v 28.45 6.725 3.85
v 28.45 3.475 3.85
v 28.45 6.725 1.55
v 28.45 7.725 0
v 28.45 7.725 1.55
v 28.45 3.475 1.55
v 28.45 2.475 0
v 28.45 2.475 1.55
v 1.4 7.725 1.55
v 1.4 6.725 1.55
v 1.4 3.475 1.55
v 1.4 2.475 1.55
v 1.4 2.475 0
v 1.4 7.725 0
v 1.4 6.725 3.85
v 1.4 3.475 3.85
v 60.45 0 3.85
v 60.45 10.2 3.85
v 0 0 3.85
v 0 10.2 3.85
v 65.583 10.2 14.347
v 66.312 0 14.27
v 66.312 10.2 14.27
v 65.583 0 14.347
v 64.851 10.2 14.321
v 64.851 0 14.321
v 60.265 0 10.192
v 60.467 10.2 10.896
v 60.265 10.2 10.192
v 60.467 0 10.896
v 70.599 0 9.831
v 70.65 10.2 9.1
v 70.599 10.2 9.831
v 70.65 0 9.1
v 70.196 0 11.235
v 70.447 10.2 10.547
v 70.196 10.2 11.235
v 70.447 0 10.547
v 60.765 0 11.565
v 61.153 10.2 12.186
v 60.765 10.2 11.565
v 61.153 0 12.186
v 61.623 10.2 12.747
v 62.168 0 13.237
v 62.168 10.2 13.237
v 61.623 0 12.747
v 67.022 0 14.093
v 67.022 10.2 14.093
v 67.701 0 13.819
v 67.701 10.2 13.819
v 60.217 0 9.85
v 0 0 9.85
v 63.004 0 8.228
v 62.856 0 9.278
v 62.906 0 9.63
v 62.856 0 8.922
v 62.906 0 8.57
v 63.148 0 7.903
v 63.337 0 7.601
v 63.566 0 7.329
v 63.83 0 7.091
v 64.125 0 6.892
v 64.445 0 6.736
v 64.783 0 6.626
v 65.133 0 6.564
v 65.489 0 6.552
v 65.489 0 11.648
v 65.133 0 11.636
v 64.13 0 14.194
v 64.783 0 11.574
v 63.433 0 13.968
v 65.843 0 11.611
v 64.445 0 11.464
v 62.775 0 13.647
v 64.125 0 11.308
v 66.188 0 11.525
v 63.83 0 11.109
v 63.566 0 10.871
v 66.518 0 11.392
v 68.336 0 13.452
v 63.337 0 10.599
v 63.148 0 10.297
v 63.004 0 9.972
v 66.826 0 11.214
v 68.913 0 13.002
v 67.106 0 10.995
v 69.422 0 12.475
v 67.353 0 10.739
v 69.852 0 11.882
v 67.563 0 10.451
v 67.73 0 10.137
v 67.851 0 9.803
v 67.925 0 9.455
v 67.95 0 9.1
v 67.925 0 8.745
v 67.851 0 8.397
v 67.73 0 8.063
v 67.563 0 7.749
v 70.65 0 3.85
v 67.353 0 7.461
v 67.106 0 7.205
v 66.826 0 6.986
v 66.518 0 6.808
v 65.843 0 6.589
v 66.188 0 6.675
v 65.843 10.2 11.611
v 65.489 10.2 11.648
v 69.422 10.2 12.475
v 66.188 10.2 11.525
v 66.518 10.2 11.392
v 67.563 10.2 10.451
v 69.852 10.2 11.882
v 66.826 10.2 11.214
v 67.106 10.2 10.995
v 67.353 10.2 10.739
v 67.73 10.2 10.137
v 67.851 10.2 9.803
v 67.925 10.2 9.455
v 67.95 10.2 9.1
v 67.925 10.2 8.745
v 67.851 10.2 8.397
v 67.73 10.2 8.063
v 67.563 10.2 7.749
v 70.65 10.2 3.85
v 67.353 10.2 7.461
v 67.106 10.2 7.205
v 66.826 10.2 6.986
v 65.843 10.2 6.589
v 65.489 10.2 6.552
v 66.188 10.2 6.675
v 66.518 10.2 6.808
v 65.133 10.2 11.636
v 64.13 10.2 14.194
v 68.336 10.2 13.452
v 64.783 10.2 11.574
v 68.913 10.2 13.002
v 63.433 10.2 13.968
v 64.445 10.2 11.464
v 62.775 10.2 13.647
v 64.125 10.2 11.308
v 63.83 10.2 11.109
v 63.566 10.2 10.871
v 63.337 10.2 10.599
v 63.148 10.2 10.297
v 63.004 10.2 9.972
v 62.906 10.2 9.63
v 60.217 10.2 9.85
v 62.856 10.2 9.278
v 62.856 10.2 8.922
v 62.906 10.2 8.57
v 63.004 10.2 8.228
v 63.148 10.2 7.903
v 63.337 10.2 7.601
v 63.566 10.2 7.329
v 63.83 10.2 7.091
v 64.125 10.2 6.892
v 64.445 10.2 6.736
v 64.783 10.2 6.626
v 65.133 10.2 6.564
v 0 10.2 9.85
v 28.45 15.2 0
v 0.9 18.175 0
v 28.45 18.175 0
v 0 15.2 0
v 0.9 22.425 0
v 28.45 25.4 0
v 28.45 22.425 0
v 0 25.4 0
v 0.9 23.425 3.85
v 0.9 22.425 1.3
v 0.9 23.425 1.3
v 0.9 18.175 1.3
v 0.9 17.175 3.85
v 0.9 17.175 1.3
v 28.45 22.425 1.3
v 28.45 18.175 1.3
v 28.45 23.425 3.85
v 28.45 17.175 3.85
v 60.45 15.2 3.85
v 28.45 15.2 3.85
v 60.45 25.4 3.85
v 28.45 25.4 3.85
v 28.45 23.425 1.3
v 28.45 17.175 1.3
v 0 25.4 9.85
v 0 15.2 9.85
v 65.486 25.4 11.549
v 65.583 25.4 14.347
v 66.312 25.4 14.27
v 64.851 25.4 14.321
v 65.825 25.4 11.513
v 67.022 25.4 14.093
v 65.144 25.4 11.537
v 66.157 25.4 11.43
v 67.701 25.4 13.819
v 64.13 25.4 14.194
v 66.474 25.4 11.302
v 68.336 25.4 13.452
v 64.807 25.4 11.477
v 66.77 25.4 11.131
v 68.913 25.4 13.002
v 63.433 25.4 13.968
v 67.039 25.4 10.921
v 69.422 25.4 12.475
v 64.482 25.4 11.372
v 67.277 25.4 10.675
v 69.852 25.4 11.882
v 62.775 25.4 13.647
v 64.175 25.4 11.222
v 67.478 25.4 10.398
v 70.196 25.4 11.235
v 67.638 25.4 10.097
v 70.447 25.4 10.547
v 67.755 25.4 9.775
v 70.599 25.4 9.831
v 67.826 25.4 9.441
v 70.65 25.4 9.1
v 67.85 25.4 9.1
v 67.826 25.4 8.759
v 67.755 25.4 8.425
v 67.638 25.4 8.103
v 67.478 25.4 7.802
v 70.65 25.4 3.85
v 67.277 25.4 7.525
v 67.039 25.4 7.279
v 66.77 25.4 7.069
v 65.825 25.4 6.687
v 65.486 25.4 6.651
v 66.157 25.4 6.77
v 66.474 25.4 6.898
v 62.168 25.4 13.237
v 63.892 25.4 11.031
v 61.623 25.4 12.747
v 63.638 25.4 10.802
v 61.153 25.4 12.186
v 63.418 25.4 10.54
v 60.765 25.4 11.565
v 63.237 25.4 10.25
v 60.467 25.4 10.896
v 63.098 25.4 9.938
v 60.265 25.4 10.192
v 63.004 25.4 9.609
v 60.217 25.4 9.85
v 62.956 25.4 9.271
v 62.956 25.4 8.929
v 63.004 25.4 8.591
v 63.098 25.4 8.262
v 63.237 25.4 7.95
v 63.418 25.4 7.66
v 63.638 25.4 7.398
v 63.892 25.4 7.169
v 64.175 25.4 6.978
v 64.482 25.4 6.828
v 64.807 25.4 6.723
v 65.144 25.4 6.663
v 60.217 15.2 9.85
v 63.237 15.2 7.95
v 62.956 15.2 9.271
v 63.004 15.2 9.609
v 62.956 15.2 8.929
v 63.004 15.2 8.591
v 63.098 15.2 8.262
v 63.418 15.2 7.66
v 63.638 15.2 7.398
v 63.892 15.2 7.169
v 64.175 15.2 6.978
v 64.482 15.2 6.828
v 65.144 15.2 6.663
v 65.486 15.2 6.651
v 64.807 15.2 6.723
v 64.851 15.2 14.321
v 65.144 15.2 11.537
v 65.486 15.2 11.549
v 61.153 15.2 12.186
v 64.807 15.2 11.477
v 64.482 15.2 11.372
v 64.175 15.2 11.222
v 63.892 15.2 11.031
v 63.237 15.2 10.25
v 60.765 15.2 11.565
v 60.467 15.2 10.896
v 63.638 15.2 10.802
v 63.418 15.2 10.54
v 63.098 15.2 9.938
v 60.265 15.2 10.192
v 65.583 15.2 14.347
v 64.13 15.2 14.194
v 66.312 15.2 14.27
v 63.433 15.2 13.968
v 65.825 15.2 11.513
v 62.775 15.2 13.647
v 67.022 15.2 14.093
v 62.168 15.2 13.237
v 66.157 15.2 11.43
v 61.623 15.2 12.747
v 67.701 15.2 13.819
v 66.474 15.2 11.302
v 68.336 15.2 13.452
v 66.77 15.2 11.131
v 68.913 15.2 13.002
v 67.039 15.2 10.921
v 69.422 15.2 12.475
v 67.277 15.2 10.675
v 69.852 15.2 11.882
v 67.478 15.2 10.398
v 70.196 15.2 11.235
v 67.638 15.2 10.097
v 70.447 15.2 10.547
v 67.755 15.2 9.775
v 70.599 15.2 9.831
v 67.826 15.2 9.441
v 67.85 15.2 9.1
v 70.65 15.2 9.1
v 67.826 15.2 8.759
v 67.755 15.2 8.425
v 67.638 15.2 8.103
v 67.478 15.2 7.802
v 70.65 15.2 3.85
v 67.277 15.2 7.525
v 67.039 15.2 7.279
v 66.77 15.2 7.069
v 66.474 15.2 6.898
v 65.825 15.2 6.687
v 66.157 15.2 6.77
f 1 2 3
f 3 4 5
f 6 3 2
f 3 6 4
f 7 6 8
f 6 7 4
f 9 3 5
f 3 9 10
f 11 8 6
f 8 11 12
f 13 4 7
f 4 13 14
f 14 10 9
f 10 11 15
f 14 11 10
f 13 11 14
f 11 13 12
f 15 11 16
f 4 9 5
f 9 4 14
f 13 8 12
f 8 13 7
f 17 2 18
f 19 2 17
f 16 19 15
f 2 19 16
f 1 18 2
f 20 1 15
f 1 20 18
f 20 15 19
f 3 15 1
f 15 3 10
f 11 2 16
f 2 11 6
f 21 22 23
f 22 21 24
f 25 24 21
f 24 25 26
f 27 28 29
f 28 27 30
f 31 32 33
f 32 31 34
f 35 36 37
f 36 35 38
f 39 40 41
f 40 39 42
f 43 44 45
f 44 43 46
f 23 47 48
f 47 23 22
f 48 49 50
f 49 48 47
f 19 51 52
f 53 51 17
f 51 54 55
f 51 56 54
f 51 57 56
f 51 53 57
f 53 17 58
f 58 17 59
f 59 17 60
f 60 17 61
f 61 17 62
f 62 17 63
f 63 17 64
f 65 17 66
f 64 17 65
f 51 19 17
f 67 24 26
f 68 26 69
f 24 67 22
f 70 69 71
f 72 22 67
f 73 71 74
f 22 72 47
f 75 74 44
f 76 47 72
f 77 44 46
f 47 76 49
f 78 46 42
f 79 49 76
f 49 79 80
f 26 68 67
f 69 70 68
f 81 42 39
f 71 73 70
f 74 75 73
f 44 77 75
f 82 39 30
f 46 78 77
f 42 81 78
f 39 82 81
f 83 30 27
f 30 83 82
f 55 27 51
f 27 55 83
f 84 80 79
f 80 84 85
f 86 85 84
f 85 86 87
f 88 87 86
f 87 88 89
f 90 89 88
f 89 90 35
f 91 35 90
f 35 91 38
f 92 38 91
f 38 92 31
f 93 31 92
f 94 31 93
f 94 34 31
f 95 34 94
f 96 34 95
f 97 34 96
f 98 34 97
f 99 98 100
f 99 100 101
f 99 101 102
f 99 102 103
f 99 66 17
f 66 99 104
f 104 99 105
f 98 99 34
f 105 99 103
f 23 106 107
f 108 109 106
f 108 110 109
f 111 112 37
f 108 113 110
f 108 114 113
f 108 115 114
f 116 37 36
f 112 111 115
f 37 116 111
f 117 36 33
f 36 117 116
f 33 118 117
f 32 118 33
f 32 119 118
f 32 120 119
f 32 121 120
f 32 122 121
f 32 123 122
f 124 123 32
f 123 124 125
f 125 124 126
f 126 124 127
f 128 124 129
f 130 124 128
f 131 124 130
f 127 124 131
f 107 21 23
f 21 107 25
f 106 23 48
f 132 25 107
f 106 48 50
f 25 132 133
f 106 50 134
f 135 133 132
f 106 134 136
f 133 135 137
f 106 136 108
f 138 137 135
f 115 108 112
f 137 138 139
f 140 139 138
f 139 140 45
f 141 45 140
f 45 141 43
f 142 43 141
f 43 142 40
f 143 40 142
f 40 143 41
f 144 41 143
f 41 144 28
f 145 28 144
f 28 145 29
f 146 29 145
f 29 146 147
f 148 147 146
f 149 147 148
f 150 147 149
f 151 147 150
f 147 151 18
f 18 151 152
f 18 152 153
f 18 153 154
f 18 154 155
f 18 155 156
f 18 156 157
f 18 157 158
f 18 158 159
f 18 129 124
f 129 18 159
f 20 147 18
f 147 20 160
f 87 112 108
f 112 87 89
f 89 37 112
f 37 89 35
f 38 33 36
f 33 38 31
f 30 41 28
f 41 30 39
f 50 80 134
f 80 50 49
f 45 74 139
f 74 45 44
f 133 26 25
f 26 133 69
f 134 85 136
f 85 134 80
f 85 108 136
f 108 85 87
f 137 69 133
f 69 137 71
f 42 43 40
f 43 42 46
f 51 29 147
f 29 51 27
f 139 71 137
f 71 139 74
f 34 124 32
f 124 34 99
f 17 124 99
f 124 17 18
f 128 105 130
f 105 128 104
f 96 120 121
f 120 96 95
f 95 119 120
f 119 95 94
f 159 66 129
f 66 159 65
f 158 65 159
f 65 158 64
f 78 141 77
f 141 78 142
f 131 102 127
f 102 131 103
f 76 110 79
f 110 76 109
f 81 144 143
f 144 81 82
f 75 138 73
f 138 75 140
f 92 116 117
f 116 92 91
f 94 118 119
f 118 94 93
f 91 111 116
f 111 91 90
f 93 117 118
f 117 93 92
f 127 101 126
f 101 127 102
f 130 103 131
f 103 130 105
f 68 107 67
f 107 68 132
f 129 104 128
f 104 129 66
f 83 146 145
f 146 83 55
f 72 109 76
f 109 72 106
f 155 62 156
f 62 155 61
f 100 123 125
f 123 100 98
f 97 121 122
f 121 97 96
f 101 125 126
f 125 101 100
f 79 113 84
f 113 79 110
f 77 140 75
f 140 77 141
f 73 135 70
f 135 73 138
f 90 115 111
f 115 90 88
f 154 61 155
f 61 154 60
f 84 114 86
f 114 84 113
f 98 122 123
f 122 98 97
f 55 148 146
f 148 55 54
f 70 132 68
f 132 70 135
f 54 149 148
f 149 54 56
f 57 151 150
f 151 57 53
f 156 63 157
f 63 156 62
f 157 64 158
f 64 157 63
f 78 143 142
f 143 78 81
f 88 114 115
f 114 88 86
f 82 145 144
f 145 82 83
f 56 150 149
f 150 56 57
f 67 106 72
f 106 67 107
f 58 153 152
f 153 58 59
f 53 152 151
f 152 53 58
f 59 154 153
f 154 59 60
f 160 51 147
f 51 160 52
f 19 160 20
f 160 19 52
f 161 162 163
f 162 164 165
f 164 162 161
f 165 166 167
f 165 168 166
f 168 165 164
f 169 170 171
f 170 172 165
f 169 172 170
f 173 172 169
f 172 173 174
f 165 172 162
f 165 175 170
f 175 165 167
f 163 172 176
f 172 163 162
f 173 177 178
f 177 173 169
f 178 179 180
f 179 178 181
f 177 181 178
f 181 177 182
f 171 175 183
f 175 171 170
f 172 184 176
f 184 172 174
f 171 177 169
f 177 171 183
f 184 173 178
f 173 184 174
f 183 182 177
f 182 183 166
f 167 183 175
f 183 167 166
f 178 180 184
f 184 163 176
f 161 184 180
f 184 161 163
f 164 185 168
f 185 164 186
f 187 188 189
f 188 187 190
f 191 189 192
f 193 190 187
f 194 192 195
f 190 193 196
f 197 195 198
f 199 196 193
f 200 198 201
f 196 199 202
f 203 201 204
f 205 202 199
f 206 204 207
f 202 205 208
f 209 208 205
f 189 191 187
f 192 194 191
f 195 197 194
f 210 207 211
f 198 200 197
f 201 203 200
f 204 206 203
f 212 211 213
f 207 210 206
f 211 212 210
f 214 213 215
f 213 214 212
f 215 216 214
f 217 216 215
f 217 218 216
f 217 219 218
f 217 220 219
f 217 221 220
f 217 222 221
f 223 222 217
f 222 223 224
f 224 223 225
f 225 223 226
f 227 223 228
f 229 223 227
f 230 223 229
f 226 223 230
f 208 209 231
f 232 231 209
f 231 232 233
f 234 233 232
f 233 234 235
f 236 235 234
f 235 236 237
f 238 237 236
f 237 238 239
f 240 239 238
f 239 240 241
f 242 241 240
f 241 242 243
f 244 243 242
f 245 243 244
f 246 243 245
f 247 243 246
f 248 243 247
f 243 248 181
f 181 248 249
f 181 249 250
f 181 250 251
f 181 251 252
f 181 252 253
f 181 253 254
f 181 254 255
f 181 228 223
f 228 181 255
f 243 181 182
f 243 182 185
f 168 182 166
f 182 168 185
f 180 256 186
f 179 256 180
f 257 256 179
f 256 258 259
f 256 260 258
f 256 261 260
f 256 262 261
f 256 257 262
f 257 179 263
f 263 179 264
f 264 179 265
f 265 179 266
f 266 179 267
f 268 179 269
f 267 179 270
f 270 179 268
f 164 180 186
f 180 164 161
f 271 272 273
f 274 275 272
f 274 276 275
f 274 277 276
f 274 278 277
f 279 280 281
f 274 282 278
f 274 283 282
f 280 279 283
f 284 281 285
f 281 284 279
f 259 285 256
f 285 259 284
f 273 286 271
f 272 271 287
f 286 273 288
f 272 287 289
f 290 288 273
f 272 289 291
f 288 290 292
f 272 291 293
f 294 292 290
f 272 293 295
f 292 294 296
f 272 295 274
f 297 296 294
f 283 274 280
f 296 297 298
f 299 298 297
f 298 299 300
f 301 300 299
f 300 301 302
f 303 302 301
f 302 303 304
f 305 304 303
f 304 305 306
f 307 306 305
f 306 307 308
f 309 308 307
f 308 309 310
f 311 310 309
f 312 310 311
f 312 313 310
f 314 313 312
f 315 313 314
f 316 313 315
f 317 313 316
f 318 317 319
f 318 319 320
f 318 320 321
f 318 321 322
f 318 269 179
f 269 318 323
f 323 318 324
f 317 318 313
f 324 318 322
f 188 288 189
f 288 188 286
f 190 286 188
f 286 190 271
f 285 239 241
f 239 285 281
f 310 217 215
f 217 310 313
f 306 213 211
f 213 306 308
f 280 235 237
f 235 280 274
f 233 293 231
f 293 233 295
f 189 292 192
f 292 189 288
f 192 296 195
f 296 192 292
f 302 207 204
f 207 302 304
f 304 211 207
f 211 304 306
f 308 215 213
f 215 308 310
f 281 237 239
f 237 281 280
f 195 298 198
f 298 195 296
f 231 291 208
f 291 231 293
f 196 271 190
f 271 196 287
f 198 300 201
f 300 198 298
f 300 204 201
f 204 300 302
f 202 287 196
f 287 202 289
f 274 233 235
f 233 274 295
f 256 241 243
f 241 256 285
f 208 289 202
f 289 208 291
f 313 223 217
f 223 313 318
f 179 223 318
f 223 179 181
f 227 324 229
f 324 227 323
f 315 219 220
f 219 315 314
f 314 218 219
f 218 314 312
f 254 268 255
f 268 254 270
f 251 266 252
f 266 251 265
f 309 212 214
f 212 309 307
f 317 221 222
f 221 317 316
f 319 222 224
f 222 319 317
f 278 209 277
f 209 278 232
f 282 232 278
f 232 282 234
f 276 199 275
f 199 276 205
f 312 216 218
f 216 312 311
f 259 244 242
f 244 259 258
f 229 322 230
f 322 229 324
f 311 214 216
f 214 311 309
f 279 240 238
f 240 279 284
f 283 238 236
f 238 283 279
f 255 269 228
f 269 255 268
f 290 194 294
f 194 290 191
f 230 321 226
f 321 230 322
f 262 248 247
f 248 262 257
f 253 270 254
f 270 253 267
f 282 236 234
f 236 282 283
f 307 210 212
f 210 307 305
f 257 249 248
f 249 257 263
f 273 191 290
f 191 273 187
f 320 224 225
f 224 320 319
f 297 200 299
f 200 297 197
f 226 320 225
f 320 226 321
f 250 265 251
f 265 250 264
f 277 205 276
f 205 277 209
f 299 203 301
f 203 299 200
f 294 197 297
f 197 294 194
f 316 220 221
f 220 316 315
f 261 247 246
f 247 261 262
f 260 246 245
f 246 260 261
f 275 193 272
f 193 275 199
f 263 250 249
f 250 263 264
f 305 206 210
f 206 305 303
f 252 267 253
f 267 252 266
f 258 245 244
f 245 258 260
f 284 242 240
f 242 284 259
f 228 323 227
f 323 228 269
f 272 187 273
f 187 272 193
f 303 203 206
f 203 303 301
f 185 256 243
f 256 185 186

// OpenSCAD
// Number of circle elements
fn = 45;
// Tolerance to ensure difference() leaves no 2d plane
dt = 0.1;
// Tolerance of the first part
t = 0.3;
// Tolerance of the second part
t2 = 0.2;

// Length of the tab
x1 = 27.35;
// Length of the bottom of the receiver
x3 = 1.1;
// Length of the plate
x2 = x1 + x3 + 32;
// Width of the tab
y1 = 5.85;
// Width of the tab to plate connector
y2 = 3.85;
// Width of the plate
y3 = 10.2;
// Distance between parts
y4 = 5;
// Height of the tab
z1 = 2.15;
// Height of the tab to plate connector
z2 = 3.85 - z1;
// Height of the plate
z3 = 6;
// Diameter of the hole, 4.5 allows for an M4 bolt
o = 4.5;
x4 = x2 - t; // Position of the hole

union() {
	// Add tolerances
	x1t = x1 - t;
	x3t = x3 + t;
	y1t = y1 - 2 * t;
	y2t = y2 - 2 * t;
	z1t = z1 - 2 * t;
	z2t = z2 + 2 * t;
	z5 = z1t + z2t;
	
	translate([x3t, (y3 - y1t) / 2, 0]) {
		cube([x1t, y1t, z1t]);
		translate([0, (y1t - y2t) / 2, z1t]) {
			cube([x1t, y2t, z2t]);
		}
	}
	translate([0, 0, z5]) {
		cube([x2, y3, z3]);
	}
	translate([x4, 0, z5]) {
		eye(o, z3 / 2, y3, tolerance = t, fn = fn);
	}
}

translate([0, y3 + y4, 0]) union() {
	// Add tolerances
	x1t = x1 + t2;
	x3t = x3 - t2;
	y1t = y1 + 2 * t2;
	y2t = y2 + 2 * t2;
	z1t = z1 + 2 * t2;
	z2t = z2 - 2 * t2;
	z5 = z1t + z2t;
	
	difference() {
		cube([x1 + x3, y3, z5]);
		translate([x3t, (y3 - y1t) / 2, 0]) {
			translate([0, (y1t - y2t) / 2, 0]) cube([x1t + dt, y2t, z2t + dt]);
			translate([0, 0, z2t]) cube([x1t + dt, y1t, z1t]);
		}
	}
	translate([0, 0, z5]) {
		cube([x2, y3, z3]);
	}
	translate([x4, 0, z5]) {
		eye(o, z3 / 2, y3, tolerance = t2, fn = fn);
	}
}

module eye(holeDiameter, edgeThickness, height, tolerance = 0, fn = 20) {
	outerD = 2 * edgeThickness + holeDiameter;
	outerR = outerD / 2;
	
	translate([outerR, 0, outerR]) {
		rotate([270, 0, 0]) difference() {
			union() {
				cylinder(h = height, d = outerD, $fn = fn);
				translate([-outerR, 0, 0]) cube([outerD, outerR, height]);
			}
			cylinder(h = height, d = holeDiameter + 2 * tolerance, $fn = fn);
		}
	}
}
